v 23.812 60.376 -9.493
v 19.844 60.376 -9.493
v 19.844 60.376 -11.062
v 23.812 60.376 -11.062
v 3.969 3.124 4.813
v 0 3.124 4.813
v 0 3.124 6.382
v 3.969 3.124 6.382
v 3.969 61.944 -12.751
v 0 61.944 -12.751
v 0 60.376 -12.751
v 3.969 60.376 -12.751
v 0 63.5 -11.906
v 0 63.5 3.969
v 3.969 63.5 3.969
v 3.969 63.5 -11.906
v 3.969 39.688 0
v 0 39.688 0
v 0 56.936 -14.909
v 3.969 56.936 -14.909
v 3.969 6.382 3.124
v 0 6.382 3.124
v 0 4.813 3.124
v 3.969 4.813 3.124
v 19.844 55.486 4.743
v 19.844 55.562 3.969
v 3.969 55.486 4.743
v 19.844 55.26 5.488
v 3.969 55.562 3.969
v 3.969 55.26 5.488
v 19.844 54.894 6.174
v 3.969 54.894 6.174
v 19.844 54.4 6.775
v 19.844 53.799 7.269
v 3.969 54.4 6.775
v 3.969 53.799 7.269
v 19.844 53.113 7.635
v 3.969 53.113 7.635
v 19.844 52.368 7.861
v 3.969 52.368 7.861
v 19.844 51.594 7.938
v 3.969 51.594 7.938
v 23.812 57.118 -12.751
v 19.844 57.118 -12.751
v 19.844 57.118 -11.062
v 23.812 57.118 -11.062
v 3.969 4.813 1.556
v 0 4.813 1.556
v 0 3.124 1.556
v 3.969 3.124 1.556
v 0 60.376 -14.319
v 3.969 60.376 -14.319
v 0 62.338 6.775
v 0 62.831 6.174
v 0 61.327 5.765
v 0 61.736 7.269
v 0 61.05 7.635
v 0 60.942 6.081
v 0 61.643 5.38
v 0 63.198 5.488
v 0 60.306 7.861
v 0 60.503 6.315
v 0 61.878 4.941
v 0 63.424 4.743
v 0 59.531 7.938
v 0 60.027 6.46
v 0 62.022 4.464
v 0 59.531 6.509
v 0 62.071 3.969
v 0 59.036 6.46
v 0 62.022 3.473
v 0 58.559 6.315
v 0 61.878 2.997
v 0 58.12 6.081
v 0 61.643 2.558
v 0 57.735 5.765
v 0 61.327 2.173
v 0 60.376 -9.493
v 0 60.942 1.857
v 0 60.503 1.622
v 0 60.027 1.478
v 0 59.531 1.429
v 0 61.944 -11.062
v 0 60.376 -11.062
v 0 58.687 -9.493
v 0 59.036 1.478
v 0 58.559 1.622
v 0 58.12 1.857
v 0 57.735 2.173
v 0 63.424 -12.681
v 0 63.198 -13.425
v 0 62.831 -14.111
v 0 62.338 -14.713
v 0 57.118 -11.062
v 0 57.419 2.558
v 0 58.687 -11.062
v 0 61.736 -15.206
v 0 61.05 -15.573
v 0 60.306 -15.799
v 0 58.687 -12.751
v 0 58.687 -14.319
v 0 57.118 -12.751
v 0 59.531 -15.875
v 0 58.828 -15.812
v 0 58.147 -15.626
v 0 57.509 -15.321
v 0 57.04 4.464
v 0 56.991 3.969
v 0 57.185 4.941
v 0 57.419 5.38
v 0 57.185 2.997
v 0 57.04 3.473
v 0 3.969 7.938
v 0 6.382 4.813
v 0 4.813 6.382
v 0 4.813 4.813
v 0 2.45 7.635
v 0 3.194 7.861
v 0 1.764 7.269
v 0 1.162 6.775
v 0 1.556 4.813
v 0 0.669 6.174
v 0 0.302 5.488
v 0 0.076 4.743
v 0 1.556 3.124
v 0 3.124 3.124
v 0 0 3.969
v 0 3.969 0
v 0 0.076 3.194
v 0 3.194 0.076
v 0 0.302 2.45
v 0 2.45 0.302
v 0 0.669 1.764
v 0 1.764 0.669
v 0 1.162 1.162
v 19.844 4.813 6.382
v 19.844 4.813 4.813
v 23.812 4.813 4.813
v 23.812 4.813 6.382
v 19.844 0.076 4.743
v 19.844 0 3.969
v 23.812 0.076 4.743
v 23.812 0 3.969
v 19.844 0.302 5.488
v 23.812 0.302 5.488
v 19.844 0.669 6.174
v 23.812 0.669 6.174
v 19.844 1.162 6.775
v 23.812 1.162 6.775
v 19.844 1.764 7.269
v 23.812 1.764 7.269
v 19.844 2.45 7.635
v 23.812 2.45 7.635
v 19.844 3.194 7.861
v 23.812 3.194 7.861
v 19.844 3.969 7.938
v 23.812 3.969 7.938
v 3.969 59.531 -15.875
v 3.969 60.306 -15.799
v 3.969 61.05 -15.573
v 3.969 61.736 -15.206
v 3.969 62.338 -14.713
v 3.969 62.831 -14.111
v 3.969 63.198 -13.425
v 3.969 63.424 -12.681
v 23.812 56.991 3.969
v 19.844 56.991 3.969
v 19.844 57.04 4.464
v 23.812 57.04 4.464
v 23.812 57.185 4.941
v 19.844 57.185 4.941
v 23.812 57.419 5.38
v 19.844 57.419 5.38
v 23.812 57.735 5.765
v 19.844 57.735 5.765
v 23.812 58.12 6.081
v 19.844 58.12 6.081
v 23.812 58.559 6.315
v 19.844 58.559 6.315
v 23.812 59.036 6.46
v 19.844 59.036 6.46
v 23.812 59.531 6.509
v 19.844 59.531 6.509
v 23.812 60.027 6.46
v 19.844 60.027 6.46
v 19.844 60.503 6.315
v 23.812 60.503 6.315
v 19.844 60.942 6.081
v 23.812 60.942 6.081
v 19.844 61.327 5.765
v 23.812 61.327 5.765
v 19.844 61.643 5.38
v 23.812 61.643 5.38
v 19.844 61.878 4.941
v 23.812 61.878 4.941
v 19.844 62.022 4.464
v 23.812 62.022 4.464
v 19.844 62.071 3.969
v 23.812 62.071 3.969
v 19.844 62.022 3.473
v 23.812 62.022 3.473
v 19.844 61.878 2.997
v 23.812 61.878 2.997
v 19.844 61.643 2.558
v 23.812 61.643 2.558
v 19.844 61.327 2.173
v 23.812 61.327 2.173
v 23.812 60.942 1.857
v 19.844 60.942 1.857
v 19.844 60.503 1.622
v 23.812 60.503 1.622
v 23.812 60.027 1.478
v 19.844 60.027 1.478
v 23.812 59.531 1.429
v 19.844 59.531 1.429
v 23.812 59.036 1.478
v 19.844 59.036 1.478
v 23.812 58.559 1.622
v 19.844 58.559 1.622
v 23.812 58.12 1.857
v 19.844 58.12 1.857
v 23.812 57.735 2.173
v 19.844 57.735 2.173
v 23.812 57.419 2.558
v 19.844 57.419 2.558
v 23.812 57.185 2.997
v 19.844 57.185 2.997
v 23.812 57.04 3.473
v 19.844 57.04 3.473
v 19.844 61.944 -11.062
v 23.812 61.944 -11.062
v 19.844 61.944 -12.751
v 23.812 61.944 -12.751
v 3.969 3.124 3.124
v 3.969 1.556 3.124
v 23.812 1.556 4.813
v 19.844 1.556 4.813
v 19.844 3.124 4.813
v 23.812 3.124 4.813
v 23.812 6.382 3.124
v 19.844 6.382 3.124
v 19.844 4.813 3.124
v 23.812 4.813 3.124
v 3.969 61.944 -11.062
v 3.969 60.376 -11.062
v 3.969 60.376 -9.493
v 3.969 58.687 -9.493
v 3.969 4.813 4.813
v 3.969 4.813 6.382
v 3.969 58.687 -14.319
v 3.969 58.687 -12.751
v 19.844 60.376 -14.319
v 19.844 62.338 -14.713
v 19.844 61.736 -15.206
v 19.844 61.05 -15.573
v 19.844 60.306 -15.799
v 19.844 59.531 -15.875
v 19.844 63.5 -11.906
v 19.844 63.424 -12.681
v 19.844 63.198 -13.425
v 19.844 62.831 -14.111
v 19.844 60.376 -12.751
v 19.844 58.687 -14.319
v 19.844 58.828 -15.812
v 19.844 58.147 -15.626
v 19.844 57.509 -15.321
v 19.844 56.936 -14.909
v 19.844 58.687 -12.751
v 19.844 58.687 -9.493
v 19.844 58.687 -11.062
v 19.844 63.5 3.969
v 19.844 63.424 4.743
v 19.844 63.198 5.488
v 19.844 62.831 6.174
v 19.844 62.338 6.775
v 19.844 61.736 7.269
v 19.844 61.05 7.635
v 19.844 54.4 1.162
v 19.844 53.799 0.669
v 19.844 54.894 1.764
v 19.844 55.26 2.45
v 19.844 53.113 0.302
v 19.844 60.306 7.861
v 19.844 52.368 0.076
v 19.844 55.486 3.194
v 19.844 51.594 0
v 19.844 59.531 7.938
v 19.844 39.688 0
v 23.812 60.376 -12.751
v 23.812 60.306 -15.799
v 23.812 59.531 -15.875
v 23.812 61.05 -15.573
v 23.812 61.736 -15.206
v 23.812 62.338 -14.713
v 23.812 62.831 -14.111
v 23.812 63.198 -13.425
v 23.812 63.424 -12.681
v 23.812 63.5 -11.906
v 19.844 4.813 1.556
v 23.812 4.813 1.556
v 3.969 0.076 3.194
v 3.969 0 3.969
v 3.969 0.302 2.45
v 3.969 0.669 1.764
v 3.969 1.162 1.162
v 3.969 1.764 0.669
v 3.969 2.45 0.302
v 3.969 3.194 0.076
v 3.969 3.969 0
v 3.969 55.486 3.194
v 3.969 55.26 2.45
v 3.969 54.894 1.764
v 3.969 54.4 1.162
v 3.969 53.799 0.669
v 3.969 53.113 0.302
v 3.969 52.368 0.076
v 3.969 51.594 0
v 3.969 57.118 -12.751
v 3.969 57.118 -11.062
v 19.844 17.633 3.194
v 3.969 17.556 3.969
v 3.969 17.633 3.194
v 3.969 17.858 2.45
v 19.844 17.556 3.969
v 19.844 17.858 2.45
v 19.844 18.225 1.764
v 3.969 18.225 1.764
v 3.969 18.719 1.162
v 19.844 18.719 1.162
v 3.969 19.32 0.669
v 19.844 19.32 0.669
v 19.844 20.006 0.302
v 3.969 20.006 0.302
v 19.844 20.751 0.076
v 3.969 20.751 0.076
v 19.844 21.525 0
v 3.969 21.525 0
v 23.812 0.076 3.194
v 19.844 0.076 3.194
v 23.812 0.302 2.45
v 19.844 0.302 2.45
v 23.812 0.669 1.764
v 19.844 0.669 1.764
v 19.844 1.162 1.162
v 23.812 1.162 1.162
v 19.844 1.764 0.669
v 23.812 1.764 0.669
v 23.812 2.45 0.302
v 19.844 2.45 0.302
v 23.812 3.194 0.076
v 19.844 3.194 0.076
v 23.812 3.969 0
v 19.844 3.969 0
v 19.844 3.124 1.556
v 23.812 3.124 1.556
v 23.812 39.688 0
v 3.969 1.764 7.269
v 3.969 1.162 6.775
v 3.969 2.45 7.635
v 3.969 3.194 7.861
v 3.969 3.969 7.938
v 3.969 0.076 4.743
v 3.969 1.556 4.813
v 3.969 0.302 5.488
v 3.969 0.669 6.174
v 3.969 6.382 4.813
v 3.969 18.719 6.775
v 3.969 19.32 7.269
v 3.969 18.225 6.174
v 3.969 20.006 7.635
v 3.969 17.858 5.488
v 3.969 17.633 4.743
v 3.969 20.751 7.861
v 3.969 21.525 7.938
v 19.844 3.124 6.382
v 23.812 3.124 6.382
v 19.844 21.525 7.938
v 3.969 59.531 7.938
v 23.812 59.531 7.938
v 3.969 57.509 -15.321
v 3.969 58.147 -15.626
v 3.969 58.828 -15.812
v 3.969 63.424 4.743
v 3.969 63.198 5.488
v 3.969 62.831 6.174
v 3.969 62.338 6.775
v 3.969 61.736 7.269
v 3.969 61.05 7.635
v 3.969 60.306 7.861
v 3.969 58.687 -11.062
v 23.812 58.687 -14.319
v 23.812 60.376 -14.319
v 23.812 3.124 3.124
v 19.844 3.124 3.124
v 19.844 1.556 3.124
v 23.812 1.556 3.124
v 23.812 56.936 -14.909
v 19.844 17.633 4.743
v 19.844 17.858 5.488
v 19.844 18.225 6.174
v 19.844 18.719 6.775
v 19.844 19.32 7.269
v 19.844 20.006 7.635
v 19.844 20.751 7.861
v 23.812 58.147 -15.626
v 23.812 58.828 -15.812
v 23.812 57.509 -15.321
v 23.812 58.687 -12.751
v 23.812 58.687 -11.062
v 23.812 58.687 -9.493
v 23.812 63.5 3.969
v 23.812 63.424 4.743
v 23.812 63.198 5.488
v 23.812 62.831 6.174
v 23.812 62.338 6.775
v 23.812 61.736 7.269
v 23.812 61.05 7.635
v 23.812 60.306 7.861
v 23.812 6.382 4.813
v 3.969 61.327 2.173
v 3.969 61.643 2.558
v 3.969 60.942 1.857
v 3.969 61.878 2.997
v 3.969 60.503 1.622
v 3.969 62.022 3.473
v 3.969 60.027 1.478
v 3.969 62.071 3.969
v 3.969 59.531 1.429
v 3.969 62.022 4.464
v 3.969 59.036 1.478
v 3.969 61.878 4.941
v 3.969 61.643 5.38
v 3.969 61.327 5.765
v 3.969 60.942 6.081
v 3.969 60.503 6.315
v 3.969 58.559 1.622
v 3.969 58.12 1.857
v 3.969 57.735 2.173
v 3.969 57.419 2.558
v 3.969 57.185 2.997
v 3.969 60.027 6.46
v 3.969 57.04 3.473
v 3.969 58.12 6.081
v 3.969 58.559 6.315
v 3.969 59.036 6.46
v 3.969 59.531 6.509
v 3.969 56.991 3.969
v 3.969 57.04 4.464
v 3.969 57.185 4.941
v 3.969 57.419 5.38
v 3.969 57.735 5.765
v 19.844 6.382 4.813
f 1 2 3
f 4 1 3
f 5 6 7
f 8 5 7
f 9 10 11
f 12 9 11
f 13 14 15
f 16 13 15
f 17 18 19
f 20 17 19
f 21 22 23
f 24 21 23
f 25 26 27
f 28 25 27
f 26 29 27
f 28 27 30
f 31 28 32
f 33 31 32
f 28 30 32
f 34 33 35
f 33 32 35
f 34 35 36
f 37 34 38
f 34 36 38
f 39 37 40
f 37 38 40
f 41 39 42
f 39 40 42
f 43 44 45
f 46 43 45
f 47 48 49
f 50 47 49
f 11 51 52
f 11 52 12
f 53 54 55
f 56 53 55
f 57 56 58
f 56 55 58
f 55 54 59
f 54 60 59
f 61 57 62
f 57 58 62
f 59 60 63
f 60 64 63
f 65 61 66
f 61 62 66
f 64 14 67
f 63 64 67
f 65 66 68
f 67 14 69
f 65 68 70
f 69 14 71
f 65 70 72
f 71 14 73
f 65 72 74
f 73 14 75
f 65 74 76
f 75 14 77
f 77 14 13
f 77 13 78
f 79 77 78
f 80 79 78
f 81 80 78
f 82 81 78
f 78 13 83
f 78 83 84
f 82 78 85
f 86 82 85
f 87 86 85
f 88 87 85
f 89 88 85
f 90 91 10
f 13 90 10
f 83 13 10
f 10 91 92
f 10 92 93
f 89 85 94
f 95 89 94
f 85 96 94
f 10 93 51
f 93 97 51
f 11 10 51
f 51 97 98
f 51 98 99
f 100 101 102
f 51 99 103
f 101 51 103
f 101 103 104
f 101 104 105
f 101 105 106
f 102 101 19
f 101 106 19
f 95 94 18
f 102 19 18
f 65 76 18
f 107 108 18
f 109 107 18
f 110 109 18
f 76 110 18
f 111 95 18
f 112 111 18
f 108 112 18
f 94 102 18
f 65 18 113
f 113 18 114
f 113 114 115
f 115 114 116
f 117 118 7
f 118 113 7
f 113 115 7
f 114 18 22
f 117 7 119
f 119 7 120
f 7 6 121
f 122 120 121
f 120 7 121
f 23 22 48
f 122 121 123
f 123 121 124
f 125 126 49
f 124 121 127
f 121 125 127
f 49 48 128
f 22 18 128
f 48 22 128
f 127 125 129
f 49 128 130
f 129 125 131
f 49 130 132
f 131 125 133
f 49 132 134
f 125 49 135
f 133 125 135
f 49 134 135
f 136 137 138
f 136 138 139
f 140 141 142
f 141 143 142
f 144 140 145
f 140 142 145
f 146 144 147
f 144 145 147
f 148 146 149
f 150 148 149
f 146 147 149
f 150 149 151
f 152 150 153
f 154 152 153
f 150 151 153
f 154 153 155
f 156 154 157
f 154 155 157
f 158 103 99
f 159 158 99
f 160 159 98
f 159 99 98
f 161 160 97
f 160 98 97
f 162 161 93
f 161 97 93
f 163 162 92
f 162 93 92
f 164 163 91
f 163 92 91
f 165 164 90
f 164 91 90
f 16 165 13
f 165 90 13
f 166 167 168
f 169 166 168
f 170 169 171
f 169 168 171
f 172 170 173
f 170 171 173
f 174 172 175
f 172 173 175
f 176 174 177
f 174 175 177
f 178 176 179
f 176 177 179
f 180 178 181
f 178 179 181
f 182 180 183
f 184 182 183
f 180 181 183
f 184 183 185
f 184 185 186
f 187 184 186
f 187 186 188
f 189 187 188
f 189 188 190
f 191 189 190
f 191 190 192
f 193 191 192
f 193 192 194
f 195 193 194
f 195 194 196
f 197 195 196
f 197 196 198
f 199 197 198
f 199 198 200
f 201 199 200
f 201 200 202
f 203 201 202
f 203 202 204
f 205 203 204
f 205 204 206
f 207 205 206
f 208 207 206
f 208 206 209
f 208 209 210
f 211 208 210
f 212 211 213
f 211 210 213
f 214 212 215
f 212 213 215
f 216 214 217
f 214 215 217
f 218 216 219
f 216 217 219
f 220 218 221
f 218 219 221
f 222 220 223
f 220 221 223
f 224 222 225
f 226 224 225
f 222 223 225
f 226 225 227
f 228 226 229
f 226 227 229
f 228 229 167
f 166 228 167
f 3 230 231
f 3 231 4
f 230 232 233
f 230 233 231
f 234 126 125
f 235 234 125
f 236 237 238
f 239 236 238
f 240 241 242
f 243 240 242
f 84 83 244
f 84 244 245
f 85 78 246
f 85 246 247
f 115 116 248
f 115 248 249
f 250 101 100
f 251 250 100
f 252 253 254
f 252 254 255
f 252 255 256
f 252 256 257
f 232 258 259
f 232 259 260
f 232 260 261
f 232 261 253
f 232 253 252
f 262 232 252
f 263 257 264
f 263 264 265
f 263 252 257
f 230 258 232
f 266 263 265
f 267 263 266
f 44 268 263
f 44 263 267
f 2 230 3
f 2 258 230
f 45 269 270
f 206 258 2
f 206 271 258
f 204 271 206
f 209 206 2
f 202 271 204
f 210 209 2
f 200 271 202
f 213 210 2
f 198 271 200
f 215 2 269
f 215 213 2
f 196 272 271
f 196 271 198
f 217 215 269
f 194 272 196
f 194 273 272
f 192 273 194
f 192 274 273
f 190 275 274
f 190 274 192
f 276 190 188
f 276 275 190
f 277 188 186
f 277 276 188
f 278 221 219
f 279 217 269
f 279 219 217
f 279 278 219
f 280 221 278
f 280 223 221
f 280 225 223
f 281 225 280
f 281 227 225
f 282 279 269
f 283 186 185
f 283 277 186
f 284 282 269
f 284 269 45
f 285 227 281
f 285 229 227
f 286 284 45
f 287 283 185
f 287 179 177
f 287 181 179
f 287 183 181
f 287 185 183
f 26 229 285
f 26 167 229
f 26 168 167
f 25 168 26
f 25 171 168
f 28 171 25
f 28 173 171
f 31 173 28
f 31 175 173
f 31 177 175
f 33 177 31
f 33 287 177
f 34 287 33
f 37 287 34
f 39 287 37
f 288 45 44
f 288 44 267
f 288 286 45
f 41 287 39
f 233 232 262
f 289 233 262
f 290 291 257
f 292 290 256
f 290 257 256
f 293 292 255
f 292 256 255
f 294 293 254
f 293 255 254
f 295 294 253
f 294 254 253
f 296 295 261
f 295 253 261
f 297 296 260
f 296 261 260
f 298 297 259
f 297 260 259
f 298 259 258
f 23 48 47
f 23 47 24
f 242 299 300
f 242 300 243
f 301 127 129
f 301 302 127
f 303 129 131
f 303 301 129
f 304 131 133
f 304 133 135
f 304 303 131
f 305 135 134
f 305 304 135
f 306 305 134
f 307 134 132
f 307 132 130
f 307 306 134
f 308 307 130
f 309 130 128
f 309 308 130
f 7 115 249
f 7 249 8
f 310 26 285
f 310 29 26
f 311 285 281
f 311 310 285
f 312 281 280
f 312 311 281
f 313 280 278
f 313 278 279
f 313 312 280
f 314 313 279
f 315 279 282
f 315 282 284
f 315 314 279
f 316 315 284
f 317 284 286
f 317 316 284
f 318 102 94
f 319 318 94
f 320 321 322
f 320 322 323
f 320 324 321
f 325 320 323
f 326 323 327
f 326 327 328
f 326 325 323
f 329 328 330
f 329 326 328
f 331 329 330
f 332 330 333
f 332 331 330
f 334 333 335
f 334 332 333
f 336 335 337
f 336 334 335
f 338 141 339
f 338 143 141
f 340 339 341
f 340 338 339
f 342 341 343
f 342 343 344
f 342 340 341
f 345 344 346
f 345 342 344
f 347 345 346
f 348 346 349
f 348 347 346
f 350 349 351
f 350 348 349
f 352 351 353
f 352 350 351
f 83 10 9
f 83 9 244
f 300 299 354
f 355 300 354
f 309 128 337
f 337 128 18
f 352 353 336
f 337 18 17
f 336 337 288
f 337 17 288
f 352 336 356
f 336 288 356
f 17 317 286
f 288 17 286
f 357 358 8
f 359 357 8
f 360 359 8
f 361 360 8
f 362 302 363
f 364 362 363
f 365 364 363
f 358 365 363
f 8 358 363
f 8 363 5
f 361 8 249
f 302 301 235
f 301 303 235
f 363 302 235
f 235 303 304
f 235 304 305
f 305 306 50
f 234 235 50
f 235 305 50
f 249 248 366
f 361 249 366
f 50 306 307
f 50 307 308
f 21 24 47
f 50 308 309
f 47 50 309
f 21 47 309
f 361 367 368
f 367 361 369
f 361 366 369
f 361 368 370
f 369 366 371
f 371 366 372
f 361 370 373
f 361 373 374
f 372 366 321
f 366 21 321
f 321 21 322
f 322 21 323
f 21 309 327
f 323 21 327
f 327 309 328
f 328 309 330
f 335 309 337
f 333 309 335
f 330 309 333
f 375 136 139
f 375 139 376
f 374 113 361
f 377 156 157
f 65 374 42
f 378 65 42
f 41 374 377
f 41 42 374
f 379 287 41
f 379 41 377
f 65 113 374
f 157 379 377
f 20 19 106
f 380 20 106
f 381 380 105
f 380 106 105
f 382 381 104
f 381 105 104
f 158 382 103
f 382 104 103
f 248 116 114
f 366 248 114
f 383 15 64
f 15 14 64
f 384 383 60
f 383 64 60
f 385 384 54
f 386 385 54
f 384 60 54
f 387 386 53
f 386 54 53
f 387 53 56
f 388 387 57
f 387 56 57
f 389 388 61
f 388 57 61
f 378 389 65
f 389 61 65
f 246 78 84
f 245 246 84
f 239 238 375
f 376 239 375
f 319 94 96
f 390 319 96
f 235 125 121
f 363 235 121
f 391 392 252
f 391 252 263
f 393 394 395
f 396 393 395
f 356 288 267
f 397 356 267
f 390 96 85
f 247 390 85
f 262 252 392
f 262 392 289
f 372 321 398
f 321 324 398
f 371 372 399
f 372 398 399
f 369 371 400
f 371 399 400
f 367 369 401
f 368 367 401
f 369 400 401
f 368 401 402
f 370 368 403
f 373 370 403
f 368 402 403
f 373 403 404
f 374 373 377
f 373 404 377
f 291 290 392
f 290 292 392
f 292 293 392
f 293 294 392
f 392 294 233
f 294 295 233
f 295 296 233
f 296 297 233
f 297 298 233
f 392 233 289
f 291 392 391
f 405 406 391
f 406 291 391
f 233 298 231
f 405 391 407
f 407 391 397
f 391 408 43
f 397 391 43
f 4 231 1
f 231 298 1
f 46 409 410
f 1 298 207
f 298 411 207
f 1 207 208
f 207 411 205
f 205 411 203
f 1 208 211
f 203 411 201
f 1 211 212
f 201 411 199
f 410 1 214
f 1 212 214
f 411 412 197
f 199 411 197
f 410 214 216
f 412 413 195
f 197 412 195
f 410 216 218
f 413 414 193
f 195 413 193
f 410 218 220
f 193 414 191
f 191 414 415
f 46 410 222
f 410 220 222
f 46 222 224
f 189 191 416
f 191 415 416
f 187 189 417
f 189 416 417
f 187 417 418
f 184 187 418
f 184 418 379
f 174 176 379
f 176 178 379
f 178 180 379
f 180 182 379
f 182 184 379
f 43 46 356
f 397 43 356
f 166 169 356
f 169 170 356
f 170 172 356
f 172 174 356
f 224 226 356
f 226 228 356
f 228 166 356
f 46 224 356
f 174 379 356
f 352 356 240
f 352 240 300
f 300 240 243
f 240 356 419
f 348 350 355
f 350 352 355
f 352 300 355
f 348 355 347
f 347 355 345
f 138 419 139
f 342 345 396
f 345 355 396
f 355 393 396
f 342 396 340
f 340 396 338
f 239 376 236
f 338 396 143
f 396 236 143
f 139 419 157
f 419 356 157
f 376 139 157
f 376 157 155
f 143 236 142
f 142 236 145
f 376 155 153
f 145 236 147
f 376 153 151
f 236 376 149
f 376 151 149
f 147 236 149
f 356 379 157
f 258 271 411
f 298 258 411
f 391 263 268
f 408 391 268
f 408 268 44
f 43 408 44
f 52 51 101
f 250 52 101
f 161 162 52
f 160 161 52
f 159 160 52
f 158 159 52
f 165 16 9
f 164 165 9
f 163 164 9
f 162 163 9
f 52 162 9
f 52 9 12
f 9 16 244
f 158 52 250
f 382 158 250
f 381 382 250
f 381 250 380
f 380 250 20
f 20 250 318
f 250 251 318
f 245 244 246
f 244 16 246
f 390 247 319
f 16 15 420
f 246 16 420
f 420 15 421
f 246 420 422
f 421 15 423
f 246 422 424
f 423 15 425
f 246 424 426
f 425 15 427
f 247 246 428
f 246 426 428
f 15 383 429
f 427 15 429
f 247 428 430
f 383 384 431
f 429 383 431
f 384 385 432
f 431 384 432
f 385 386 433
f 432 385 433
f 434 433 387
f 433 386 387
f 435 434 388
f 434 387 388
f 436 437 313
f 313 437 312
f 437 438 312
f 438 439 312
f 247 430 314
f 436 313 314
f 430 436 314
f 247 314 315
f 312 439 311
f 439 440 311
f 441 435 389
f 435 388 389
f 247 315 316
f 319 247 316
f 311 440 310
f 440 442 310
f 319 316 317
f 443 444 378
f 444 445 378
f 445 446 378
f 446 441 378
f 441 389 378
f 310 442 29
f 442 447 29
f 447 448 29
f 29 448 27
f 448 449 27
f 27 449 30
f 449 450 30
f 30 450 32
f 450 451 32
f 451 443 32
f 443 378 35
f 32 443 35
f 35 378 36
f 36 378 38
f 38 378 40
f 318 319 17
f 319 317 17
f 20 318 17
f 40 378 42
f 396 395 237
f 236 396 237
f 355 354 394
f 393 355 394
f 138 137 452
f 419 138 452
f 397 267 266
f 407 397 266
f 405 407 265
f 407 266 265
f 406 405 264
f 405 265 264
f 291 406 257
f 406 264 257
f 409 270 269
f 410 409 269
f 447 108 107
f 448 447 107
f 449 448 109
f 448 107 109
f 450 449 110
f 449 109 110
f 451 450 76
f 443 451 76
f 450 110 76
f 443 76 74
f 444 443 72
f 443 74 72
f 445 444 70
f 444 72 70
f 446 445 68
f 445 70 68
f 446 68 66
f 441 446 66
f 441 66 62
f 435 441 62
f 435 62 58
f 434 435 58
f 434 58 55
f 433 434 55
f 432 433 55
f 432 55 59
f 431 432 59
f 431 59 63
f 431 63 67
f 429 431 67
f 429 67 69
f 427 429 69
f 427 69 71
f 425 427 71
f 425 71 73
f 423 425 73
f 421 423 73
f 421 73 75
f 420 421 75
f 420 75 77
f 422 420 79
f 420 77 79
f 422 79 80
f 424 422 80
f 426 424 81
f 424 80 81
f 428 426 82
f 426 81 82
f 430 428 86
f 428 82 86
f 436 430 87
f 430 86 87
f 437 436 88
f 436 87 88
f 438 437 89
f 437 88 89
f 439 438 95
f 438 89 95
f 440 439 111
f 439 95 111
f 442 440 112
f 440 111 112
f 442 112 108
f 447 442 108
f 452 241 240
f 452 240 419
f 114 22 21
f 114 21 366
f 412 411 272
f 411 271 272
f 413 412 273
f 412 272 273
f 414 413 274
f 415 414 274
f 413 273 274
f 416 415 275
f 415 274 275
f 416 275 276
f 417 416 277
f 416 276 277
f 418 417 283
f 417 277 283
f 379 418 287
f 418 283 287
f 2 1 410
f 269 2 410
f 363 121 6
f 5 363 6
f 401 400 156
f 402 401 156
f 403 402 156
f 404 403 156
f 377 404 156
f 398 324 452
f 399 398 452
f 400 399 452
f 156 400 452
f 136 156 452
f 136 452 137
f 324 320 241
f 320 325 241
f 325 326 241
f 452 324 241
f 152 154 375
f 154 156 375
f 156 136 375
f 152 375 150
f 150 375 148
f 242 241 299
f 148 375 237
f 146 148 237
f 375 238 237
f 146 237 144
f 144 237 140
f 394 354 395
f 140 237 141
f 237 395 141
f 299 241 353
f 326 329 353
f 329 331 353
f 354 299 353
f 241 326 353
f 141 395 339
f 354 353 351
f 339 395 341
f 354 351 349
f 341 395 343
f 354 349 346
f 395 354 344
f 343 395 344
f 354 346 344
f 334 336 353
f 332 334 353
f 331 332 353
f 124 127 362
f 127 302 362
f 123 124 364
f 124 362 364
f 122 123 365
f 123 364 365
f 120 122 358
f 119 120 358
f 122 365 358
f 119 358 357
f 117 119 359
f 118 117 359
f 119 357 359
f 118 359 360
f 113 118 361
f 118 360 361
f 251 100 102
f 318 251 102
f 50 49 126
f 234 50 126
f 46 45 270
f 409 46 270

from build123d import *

# Parameters (mm, degrees)
F1_DEPTH = 7.9375
F2_R     = 3.96874
F3_W     = 3.96875
F3_H     = 23.8125
F4_DEPTH = 15.875
F5_W     = 1.56845
F5_H     = 1.6891
F5_W_2   = 1.6891
F5_H_2   = 1.56845
F5_R     = 2.54
F6_DEPTH = 23.8125


# Not quite as in the source:
# - a fillet or chamfer is up to 0.001 mm smaller than in the source, because OpenCascade refuses the exact size


with BuildPart() as f1:
    # F0 (on Top) → F1 (new body)
    with BuildSketch(Plane.XY):
        Polygon((0, 63.5), (0, 0), (3.96875, 0), (3.96875, 17.5562514), (19.84375, 17.5562514), (19.84375, 0), (23.8125, 0), (23.8125, 63.5), (19.84375, 63.5), (19.84375, 55.5625), (3.96875, 55.5625), (3.96875, 63.5), align=None)
    extrude(amount=F1_DEPTH)

    # F2 (radius 3.96875 in the source; OpenCascade refuses exactly that, so slightly less here)
    f2_edges = [f1.edges().sort_by_distance(p)[0] for p in [
        (11.90625, 55.5625, 7.9375),
        (11.90625, 55.5625, 0),
        (1.984375, 63.5, 7.9375),
        (21.828125, 63.5, 7.9375),
        (1.984375, 0, 7.9375),
        (1.984375, 0, 0),
        (21.828125, 0, 7.9375),
        (21.828125, 0, 0),
        (11.90625, 17.556251, 7.9375),
        (11.90625, 17.556251, 0),
    ]]
    fillet(f2_edges, radius=F2_R)

    # F3 (on face) → F4 (join)
    with BuildSketch(Plane(origin=(0, 0, 0), x_dir=(1, 0, 0), z_dir=(0, 0, -1))):
        with Locations((21.828125, -51.59375)):
            Rectangle(F3_W, F3_H)
        with Locations((1.984375, -51.59375)):
            Rectangle(F3_W, F3_H)
    extrude(amount=F4_DEPTH)

    # F5 (on face) → F6 (cut, through all)
    with BuildSketch(Plane(origin=(0, 0, 0), x_dir=(0, -1, 0), z_dir=(-1, 0, 0))):
        with Locations((-5.597525, 3.96875)):
            Rectangle(F5_W, F5_H)
        with Locations((-3.96875, 3.96875)):
            Rectangle(F5_W_2, F5_H)
        with Locations((-3.96875, 2.339975)):
            Rectangle(F5_W_2, F5_H_2)
        with Locations((-2.339975, 3.96875)):
            Rectangle(F5_W, F5_H)
        with Locations((-3.96875, 5.597525)):
            Rectangle(F5_W_2, F5_H_2)
        with BuildLine():
            Line((-63.5, -15.875), (-59.53125, -15.875))
            ThreePointArc((-59.53125, -15.875), (-62.3375800378, -14.7125800378), (-63.5, -11.90625))
            Line((-63.5, -11.90625), (-63.5, -15.875))
        make_face()
        with BuildLine():
            Line((-59.53125, -15.875), (-39.6875, -15.875))
            Line((-39.6875, -15.875), (-39.6875, 0))
            Line((-39.6875, 0), (-56.935957382, -14.9088210299))
            ThreePointArc((-56.935957382, -14.9088210299), (-58.146597916, -15.6256202651), (-59.53125, -15.875))
        make_face()
        with Locations((-57.902475, -11.90625)):
            Rectangle(F5_W, F5_H)
        with Locations((-59.53125, -11.90625)):
            Rectangle(F5_W_2, F5_H)
        with Locations((-59.53125, -10.277475)):
            Rectangle(F5_W_2, F5_H_2)
        with Locations((-61.160025, -11.90625)):
            Rectangle(F5_W, F5_H)
        with Locations((-59.53125, -13.535025)):
            Rectangle(F5_W_2, F5_H_2)
        with Locations((-59.53125, 3.96875)):
            Circle(F5_R)
    extrude(amount=-F6_DEPTH, mode=Mode.SUBTRACT)


solid = f1.part
